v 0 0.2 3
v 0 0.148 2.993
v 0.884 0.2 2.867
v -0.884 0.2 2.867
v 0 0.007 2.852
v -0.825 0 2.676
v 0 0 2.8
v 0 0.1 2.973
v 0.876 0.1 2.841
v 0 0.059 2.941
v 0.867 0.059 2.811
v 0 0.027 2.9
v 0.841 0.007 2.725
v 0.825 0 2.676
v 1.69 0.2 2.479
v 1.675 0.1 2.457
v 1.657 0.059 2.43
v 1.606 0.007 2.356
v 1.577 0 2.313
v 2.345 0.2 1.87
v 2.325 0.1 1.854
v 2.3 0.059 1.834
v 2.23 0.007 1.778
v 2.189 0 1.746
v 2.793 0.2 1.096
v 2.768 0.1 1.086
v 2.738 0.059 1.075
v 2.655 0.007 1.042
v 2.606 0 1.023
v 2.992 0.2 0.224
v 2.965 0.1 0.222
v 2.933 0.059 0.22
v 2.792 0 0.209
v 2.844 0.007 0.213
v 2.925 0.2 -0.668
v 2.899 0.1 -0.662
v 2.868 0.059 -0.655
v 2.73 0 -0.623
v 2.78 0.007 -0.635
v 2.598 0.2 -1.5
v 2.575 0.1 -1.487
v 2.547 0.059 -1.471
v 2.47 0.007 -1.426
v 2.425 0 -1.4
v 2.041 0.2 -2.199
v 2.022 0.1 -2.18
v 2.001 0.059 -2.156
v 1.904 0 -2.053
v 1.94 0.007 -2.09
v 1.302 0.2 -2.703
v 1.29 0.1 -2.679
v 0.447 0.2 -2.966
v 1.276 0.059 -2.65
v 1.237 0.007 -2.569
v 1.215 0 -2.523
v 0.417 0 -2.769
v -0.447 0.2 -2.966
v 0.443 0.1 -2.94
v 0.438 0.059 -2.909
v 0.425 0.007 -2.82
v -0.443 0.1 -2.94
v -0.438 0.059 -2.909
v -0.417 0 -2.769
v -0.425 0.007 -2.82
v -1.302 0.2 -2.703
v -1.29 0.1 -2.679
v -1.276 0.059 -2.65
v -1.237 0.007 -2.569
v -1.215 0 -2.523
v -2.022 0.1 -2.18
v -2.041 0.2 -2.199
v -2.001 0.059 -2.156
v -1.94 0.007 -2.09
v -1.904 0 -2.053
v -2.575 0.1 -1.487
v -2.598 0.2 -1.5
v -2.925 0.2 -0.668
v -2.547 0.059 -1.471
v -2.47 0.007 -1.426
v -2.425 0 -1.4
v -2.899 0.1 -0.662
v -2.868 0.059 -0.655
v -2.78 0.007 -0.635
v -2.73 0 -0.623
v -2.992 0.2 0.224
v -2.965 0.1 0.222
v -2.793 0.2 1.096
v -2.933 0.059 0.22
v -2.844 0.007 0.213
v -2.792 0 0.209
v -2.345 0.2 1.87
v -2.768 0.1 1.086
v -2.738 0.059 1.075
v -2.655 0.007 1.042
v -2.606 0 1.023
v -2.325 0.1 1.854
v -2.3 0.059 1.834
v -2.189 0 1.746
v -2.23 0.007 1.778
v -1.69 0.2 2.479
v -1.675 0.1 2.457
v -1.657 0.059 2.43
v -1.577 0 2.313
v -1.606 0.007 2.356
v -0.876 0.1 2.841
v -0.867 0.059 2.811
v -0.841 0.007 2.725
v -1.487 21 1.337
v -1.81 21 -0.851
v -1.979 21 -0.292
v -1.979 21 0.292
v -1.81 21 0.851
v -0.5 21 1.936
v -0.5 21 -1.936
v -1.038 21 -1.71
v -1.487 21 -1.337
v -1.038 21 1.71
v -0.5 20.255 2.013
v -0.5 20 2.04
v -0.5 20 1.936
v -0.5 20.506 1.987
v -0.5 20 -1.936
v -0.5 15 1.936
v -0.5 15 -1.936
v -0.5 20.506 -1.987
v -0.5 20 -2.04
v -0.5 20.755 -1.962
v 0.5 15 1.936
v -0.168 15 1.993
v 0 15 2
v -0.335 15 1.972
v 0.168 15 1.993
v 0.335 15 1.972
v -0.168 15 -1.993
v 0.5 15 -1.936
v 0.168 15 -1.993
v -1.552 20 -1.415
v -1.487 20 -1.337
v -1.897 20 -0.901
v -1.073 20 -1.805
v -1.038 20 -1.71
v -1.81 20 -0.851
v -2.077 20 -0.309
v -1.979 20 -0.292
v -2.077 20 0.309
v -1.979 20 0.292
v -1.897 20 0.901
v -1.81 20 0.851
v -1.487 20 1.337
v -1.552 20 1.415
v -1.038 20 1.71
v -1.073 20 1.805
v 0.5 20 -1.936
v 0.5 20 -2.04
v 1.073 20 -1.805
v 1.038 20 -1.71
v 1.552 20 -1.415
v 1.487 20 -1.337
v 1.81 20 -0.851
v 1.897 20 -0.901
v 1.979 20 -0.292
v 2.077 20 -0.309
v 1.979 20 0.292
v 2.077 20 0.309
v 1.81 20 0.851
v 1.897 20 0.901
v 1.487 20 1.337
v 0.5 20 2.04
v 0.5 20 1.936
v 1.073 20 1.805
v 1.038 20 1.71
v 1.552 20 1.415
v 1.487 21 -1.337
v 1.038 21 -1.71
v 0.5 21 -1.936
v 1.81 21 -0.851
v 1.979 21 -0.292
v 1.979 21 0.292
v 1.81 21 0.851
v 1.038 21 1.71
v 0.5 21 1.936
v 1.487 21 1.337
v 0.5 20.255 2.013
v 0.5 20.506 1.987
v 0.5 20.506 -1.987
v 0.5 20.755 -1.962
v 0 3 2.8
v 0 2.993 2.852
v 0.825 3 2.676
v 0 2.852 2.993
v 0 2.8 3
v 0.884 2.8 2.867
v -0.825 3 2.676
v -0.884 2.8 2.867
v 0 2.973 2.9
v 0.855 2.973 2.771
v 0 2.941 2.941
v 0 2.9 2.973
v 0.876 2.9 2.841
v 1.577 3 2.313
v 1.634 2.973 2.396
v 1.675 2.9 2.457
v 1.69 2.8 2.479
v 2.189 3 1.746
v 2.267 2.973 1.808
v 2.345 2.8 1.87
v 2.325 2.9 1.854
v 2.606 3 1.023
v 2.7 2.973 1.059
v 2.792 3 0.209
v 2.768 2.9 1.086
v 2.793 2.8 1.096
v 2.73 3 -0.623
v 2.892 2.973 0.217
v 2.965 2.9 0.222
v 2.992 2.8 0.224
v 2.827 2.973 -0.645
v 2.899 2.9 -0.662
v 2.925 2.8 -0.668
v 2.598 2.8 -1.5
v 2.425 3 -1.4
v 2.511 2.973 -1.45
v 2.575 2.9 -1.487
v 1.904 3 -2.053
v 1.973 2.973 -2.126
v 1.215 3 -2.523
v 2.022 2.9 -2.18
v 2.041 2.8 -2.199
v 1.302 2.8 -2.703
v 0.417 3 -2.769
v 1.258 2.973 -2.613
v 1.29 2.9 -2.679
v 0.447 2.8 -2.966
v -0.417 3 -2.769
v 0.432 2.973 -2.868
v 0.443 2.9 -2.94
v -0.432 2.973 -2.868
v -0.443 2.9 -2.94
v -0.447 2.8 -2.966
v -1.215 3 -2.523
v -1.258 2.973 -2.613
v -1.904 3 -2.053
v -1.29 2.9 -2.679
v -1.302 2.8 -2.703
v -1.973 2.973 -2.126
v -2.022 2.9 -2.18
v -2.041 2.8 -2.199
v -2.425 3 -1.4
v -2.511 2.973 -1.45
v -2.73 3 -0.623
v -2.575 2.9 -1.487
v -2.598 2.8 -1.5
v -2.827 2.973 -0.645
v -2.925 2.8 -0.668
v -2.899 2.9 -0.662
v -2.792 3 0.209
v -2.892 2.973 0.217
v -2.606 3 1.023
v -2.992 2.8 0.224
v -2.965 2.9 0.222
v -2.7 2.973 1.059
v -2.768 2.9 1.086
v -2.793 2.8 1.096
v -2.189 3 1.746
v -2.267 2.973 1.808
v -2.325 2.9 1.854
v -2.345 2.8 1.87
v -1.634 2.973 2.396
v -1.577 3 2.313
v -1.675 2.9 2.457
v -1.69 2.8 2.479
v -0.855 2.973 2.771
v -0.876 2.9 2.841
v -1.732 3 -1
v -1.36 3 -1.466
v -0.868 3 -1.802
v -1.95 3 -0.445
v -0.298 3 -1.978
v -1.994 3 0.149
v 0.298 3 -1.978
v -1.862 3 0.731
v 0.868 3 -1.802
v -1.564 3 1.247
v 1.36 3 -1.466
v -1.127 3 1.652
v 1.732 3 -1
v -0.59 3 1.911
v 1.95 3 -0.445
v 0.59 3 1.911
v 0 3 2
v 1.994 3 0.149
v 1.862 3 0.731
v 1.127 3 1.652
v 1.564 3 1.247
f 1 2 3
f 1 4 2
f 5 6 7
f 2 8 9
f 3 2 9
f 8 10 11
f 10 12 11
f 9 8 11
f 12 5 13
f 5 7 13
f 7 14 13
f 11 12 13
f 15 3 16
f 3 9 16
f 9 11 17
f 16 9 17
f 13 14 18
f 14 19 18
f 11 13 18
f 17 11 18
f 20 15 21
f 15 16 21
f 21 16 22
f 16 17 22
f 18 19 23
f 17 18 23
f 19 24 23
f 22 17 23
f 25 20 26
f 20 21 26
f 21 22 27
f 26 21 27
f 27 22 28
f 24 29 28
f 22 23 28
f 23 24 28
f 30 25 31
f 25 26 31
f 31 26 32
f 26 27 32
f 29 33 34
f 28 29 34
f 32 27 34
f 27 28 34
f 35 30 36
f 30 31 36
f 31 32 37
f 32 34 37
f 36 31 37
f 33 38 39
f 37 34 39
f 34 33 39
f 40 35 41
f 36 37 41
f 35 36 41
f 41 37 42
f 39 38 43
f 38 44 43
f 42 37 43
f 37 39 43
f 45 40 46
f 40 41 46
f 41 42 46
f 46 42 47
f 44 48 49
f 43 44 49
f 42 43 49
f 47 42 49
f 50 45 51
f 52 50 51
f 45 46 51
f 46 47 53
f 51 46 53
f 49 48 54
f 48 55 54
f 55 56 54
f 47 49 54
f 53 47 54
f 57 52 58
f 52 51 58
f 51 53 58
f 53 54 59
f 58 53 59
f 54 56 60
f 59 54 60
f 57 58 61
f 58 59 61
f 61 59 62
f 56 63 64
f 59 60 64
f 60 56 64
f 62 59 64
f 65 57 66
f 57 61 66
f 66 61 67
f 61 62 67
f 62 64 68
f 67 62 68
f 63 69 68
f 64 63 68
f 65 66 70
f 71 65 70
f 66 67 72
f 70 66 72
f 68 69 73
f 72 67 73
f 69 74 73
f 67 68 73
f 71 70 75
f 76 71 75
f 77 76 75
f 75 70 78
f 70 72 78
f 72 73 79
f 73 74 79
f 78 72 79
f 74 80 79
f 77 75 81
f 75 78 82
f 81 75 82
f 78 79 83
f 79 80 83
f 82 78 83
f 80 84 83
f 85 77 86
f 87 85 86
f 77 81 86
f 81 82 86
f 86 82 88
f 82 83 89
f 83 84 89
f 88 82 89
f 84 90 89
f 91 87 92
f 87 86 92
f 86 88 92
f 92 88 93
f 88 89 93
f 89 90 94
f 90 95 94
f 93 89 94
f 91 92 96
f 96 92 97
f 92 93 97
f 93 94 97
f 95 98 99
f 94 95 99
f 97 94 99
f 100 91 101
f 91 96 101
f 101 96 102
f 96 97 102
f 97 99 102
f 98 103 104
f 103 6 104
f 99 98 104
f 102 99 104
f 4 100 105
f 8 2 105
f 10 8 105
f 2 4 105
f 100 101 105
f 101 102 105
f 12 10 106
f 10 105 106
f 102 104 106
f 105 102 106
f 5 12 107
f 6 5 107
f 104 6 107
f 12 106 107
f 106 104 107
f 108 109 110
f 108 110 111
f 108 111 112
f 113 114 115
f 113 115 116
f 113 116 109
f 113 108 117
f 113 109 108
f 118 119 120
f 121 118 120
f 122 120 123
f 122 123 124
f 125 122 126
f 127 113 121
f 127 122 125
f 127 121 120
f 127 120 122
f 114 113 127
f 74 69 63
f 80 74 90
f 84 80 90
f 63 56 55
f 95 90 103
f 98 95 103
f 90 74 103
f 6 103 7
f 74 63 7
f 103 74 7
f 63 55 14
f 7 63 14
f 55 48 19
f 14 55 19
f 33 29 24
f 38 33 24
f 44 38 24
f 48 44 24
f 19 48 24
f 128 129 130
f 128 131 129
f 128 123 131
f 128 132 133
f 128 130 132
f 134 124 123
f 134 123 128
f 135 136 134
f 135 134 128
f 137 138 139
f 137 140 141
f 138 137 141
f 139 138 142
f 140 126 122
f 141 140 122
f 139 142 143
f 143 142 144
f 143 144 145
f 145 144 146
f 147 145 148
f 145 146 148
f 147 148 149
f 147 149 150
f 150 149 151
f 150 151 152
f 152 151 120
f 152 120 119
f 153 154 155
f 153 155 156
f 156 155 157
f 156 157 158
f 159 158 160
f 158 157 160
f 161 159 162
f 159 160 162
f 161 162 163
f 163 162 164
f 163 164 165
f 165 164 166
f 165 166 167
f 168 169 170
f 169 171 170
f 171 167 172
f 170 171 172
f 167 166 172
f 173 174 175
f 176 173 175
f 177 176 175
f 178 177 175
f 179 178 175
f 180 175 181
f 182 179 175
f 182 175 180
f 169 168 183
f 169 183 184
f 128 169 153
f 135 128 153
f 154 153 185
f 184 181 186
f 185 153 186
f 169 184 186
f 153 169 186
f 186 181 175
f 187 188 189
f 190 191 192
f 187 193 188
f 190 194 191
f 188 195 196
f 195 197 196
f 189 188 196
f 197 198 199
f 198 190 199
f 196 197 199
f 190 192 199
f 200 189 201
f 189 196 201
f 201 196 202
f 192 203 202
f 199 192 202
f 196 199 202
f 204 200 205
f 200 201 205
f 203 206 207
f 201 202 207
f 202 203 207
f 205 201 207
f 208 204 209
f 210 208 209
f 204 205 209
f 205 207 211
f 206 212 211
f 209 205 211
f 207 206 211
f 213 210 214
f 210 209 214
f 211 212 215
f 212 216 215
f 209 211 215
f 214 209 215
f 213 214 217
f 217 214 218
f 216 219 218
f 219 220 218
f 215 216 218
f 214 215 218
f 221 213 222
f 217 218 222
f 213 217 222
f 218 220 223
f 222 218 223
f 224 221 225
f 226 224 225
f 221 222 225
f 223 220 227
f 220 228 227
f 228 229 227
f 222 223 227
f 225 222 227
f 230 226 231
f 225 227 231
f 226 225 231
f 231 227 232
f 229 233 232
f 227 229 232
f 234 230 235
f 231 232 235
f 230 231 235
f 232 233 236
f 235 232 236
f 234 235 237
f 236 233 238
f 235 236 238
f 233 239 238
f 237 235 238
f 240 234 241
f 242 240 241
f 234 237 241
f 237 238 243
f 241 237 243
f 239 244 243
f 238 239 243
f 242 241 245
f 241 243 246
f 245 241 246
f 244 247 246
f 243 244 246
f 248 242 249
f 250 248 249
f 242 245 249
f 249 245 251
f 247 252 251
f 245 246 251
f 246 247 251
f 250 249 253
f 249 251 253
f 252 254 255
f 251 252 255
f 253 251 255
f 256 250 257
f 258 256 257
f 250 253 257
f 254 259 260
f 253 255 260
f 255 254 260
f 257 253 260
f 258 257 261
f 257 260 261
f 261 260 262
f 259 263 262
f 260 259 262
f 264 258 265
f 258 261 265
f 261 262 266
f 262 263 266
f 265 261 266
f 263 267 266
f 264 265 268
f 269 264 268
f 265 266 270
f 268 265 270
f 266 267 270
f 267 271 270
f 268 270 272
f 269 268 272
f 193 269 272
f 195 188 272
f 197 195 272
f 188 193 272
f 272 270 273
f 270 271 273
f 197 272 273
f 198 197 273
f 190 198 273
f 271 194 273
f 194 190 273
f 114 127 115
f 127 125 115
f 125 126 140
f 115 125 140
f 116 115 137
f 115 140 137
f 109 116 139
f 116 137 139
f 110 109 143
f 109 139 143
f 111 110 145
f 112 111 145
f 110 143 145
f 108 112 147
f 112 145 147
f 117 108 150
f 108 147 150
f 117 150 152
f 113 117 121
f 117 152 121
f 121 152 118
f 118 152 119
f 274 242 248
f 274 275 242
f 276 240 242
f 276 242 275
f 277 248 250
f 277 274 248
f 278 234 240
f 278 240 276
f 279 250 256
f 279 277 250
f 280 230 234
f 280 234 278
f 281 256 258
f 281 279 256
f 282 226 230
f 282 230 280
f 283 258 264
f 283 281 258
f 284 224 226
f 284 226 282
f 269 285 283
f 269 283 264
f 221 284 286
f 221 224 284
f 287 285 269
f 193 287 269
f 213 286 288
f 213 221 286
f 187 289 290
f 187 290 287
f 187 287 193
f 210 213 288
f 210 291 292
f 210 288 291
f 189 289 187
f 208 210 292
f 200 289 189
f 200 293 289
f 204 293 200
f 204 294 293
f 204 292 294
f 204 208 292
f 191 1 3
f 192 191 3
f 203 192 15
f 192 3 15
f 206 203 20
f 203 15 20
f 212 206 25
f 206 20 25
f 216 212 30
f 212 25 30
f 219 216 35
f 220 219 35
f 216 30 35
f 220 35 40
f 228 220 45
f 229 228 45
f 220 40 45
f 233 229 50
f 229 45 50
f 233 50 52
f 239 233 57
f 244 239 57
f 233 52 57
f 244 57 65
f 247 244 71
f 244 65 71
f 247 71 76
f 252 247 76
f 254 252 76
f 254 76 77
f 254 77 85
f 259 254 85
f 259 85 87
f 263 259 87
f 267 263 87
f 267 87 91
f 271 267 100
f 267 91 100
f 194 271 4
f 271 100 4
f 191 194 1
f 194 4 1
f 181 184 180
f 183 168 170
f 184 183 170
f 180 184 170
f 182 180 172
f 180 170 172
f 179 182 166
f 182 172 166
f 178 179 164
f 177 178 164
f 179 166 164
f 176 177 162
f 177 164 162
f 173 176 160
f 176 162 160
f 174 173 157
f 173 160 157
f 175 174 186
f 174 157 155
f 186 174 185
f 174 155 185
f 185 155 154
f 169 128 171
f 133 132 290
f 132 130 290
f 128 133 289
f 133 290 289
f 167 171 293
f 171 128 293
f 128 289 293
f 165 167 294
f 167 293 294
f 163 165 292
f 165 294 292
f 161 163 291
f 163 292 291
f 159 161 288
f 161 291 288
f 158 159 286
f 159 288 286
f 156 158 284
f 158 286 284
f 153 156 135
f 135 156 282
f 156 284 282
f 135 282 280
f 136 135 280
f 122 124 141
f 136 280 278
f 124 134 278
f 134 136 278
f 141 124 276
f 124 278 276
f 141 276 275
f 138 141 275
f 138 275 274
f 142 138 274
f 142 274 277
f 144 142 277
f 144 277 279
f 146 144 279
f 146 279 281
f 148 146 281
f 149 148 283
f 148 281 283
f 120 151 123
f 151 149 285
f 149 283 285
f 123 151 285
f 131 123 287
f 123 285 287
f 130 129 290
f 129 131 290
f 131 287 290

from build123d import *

# Parameters (mm, degrees)
SKETCH_1_R          = 3
EXTRUDE_1_DEPTH     = 3
SKETCH_2_R          = 2
EXTRUDE_2_DEPTH     = 18
SKETCH_4_W          = 1
SKETCH_4_H          = 4.937645572
CUT_EXTRUDE_1_DEPTH = 6
FILLET_1_R          = 0.2


with BuildPart() as part:
    # 草图1 → 凸台-拉伸1 (new body)
    with BuildSketch(Plane(origin=(0, 0, 0), x_dir=(1, 0, 0), z_dir=(0, 1, 0))):
        with Locations(Location((0, 0, 0), (0, 0, 270))):
            Circle(SKETCH_1_R)
    extrude(amount=EXTRUDE_1_DEPTH)

    # 草图2 → 凸台-拉伸2 (add)
    with BuildSketch(Plane(origin=(0, 3, 0), x_dir=(1, 0, 0), z_dir=(0, 1, 0))):
        with Locations(Location((0, 0, 0), (0, 0, 270))):
            Circle(SKETCH_2_R)
    extrude(amount=EXTRUDE_2_DEPTH)

    # 草图3 → 旋转1 (revolve)
    with BuildSketch(Plane.XY, mode=Mode.PRIVATE) as revolve_1_sk:
        Polygon((0, 21), (-2, 21), (-2.1, 20), (0, 20), align=None)
    revolve(revolve_1_sk.sketch.rotate(Axis((0, 20, 0), (0, 1, 0)), 90), axis=Axis((0, 20, 0), (0, 1, 0)))

    # 草图4 → 切除-拉伸1 (cut)
    with BuildSketch(Plane(origin=(0, 21, 0), x_dir=(1, 0, 0), z_dir=(0, 1, 0))):
        Rectangle(SKETCH_4_W, SKETCH_4_H)
    extrude(amount=-CUT_EXTRUDE_1_DEPTH, mode=Mode.SUBTRACT)

    # 圆角1
    fillet_1_edges = [part.edges().sort_by_distance(p)[0] for p in [
        (0, 0, -3),
        (0, 3, -3),
    ]]
    fillet(fillet_1_edges, radius=FILLET_1_R)


solid = part.part
